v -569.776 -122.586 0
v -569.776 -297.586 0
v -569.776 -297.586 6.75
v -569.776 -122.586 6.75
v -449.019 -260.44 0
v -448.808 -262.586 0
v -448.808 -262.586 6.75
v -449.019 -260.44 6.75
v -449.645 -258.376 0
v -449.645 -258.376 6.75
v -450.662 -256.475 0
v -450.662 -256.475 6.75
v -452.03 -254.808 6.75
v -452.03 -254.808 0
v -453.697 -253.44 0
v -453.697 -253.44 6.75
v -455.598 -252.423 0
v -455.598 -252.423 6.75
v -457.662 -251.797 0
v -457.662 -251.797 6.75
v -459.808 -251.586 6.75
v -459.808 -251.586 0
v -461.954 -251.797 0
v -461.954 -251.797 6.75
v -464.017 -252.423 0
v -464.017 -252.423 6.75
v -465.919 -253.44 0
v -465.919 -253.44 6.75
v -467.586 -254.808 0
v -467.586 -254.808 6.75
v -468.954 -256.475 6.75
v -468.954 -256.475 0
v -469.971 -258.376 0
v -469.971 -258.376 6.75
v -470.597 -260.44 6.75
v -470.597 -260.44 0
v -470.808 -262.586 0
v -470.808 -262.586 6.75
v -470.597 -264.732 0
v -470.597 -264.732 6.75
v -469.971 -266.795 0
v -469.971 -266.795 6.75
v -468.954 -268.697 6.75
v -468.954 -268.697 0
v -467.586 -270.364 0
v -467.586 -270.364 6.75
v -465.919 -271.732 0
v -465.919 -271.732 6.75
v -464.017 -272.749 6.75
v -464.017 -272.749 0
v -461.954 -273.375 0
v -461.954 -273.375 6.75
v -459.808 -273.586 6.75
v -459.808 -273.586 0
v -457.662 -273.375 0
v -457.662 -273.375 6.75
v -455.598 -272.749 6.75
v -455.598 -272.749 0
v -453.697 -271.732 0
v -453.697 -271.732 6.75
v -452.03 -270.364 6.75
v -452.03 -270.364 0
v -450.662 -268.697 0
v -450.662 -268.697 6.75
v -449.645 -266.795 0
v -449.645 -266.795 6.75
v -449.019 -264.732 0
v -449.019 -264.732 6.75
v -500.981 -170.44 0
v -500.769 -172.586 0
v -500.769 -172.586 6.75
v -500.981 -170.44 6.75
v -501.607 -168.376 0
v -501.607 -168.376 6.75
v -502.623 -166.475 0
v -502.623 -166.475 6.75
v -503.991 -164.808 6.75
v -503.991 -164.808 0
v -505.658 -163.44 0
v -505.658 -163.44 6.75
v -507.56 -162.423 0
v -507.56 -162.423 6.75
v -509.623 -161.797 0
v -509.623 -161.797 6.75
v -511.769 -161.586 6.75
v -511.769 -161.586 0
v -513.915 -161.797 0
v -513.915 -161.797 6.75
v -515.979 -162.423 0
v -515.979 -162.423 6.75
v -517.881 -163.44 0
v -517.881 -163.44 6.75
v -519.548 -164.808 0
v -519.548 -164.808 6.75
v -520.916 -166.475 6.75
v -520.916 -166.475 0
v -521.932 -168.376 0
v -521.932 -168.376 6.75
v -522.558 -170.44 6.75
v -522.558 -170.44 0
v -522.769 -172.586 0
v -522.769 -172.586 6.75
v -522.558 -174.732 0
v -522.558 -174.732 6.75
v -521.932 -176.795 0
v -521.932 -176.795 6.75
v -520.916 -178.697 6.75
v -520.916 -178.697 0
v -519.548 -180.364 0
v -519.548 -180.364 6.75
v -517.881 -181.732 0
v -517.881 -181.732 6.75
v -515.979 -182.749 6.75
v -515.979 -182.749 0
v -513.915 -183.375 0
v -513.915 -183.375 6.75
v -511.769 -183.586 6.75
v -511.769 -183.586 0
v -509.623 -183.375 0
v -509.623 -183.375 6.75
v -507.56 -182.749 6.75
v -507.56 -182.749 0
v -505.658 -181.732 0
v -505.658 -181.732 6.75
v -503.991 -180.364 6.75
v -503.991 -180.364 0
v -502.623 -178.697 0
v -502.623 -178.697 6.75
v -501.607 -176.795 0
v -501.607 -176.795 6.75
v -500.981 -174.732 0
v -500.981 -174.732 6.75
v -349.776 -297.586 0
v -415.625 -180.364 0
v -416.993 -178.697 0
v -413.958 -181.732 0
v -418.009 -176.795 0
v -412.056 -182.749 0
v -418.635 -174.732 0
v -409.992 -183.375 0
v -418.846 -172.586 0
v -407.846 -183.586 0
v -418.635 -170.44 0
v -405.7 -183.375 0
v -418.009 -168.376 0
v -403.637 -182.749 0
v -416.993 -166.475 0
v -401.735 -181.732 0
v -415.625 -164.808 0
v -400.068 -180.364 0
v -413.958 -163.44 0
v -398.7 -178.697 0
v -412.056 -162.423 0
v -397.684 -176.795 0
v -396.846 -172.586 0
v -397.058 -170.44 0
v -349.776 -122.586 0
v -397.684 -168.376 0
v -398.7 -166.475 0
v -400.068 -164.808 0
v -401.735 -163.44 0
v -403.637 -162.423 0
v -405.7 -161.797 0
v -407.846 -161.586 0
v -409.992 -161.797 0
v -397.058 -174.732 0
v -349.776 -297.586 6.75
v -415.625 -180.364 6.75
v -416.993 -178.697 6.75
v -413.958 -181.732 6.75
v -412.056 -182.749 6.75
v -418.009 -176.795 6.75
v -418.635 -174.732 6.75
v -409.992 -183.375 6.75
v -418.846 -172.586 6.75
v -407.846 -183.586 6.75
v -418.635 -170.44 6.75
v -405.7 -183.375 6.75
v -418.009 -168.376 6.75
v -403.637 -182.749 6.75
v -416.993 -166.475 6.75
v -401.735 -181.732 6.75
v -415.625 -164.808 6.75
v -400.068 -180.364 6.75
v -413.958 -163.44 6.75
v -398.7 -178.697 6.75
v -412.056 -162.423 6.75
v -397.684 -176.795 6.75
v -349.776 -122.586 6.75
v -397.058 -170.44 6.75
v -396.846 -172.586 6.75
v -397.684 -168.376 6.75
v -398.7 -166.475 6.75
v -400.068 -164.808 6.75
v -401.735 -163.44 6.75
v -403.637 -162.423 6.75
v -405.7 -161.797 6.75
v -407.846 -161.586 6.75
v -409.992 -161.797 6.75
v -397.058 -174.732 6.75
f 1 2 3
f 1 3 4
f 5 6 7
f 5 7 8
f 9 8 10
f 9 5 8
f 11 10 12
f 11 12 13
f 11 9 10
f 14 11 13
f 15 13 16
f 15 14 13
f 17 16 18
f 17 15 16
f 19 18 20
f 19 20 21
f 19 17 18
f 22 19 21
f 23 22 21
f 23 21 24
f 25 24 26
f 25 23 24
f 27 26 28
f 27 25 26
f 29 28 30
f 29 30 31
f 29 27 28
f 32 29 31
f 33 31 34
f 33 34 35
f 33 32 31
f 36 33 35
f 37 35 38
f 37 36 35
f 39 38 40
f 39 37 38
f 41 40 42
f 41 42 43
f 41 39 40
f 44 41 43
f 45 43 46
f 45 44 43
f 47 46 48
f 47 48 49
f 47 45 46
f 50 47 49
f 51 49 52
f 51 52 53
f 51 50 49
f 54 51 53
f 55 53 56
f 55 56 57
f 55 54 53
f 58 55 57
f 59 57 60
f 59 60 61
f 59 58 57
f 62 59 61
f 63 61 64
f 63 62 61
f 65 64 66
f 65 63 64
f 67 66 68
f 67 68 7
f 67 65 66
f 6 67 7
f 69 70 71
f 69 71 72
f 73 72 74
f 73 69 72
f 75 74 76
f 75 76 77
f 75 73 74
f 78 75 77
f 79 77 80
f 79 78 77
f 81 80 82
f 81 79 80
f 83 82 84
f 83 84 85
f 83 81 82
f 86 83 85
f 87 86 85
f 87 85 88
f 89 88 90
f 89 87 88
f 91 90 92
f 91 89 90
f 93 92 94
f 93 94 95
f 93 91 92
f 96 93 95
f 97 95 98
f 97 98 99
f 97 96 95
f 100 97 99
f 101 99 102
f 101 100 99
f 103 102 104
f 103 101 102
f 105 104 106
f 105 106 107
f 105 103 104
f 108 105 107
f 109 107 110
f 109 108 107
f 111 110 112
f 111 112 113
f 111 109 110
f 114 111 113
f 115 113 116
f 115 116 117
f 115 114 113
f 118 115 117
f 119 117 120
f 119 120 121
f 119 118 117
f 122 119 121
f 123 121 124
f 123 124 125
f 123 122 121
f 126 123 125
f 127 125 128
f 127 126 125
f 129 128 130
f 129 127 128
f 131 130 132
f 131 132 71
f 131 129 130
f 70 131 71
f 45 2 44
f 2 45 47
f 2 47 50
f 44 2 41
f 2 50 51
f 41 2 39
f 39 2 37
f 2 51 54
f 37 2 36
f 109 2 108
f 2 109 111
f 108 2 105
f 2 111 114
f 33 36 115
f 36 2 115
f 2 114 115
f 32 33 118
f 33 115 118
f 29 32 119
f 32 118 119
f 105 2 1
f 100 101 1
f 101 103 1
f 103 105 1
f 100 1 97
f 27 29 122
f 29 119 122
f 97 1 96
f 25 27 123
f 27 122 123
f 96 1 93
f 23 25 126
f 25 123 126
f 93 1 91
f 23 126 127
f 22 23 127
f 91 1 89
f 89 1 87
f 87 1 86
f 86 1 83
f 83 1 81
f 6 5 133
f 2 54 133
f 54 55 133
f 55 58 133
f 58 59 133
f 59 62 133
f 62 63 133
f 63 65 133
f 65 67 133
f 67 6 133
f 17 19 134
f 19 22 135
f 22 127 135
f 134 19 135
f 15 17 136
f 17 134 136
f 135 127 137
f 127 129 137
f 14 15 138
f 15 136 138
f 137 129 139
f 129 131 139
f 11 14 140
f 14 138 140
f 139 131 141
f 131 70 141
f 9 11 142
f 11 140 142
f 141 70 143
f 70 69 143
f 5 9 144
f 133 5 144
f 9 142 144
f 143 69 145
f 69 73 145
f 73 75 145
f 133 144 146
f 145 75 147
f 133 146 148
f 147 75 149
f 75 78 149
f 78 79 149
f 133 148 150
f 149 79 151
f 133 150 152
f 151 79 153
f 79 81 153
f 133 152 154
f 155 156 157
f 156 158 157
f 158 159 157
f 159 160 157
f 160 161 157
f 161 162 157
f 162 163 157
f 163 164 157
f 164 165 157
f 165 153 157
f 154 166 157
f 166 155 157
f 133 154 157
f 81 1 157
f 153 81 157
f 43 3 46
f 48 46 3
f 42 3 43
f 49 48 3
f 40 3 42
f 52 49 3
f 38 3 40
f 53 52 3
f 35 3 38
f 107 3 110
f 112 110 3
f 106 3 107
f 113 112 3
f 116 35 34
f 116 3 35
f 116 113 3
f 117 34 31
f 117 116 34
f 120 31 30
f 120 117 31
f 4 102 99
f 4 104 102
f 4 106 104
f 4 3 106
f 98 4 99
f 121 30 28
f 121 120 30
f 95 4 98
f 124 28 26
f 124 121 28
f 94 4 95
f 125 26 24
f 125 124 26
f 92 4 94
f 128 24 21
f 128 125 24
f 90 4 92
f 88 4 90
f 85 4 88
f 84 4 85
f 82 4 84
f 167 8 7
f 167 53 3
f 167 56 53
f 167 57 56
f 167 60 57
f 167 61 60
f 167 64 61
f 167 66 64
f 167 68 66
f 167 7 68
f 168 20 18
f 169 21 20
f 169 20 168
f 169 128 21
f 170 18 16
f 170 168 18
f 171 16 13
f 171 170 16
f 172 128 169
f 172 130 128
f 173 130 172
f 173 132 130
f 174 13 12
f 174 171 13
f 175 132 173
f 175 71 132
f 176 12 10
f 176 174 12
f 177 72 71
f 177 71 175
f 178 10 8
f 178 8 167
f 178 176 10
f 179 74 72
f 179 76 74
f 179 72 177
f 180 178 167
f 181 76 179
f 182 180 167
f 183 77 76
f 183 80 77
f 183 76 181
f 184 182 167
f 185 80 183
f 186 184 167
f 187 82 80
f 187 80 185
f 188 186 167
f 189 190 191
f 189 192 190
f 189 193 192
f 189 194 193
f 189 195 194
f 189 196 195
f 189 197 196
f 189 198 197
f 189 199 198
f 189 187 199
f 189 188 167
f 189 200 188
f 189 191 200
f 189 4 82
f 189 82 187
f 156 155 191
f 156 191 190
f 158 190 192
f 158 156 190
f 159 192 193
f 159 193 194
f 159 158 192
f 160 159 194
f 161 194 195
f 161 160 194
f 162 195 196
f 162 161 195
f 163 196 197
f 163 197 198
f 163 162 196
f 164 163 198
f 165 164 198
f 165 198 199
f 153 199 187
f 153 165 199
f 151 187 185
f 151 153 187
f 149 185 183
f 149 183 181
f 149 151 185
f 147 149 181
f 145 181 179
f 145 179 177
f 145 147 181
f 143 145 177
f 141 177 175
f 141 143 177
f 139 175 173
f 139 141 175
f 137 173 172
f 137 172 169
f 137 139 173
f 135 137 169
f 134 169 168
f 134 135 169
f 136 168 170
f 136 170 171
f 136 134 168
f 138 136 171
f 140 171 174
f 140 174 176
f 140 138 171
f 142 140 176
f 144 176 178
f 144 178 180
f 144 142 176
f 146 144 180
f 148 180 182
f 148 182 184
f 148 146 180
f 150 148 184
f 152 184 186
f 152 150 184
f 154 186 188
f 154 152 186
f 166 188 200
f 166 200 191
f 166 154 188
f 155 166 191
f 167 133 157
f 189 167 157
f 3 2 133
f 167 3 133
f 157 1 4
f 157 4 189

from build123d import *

# Parameters (mm, degrees)
SKETCH6_W           = 220
SKETCH6_H           = 175
SKETCH6_R           = 11
SKETCH6_R_2         = 24
BOSS_EXTRUDE1_DEPTH = 6.75


with BuildPart() as part:
    # Sketch6 → Boss-Extrude1 (new body)
    # profile 1 of 2: a face of its own
    with BuildSketch(Plane.XY):
        with Locations((-459.776309557, -210.085944494)):
            Rectangle(SKETCH6_W, SKETCH6_H)
        with Locations((-459.807870528, -262.585944494)):
            Circle(SKETCH6_R, mode=Mode.SUBTRACT)
        with Locations((-407.846346301, -172.585944494)):
            Circle(SKETCH6_R, mode=Mode.SUBTRACT)
        with Locations((-511.769394755, -172.585944494)):
            Circle(SKETCH6_R, mode=Mode.SUBTRACT)
        with Locations((-459.807870528, -202.585944494)):
            Circle(SKETCH6_R_2, mode=Mode.SUBTRACT)
    # profile 2 of 2: a face of its own
    with BuildSketch(Plane.XY):
        with Locations((-459.807870528, -202.585944494)):
            Circle(SKETCH6_R_2)
    extrude(amount=BOSS_EXTRUDE1_DEPTH)


solid = part.part
